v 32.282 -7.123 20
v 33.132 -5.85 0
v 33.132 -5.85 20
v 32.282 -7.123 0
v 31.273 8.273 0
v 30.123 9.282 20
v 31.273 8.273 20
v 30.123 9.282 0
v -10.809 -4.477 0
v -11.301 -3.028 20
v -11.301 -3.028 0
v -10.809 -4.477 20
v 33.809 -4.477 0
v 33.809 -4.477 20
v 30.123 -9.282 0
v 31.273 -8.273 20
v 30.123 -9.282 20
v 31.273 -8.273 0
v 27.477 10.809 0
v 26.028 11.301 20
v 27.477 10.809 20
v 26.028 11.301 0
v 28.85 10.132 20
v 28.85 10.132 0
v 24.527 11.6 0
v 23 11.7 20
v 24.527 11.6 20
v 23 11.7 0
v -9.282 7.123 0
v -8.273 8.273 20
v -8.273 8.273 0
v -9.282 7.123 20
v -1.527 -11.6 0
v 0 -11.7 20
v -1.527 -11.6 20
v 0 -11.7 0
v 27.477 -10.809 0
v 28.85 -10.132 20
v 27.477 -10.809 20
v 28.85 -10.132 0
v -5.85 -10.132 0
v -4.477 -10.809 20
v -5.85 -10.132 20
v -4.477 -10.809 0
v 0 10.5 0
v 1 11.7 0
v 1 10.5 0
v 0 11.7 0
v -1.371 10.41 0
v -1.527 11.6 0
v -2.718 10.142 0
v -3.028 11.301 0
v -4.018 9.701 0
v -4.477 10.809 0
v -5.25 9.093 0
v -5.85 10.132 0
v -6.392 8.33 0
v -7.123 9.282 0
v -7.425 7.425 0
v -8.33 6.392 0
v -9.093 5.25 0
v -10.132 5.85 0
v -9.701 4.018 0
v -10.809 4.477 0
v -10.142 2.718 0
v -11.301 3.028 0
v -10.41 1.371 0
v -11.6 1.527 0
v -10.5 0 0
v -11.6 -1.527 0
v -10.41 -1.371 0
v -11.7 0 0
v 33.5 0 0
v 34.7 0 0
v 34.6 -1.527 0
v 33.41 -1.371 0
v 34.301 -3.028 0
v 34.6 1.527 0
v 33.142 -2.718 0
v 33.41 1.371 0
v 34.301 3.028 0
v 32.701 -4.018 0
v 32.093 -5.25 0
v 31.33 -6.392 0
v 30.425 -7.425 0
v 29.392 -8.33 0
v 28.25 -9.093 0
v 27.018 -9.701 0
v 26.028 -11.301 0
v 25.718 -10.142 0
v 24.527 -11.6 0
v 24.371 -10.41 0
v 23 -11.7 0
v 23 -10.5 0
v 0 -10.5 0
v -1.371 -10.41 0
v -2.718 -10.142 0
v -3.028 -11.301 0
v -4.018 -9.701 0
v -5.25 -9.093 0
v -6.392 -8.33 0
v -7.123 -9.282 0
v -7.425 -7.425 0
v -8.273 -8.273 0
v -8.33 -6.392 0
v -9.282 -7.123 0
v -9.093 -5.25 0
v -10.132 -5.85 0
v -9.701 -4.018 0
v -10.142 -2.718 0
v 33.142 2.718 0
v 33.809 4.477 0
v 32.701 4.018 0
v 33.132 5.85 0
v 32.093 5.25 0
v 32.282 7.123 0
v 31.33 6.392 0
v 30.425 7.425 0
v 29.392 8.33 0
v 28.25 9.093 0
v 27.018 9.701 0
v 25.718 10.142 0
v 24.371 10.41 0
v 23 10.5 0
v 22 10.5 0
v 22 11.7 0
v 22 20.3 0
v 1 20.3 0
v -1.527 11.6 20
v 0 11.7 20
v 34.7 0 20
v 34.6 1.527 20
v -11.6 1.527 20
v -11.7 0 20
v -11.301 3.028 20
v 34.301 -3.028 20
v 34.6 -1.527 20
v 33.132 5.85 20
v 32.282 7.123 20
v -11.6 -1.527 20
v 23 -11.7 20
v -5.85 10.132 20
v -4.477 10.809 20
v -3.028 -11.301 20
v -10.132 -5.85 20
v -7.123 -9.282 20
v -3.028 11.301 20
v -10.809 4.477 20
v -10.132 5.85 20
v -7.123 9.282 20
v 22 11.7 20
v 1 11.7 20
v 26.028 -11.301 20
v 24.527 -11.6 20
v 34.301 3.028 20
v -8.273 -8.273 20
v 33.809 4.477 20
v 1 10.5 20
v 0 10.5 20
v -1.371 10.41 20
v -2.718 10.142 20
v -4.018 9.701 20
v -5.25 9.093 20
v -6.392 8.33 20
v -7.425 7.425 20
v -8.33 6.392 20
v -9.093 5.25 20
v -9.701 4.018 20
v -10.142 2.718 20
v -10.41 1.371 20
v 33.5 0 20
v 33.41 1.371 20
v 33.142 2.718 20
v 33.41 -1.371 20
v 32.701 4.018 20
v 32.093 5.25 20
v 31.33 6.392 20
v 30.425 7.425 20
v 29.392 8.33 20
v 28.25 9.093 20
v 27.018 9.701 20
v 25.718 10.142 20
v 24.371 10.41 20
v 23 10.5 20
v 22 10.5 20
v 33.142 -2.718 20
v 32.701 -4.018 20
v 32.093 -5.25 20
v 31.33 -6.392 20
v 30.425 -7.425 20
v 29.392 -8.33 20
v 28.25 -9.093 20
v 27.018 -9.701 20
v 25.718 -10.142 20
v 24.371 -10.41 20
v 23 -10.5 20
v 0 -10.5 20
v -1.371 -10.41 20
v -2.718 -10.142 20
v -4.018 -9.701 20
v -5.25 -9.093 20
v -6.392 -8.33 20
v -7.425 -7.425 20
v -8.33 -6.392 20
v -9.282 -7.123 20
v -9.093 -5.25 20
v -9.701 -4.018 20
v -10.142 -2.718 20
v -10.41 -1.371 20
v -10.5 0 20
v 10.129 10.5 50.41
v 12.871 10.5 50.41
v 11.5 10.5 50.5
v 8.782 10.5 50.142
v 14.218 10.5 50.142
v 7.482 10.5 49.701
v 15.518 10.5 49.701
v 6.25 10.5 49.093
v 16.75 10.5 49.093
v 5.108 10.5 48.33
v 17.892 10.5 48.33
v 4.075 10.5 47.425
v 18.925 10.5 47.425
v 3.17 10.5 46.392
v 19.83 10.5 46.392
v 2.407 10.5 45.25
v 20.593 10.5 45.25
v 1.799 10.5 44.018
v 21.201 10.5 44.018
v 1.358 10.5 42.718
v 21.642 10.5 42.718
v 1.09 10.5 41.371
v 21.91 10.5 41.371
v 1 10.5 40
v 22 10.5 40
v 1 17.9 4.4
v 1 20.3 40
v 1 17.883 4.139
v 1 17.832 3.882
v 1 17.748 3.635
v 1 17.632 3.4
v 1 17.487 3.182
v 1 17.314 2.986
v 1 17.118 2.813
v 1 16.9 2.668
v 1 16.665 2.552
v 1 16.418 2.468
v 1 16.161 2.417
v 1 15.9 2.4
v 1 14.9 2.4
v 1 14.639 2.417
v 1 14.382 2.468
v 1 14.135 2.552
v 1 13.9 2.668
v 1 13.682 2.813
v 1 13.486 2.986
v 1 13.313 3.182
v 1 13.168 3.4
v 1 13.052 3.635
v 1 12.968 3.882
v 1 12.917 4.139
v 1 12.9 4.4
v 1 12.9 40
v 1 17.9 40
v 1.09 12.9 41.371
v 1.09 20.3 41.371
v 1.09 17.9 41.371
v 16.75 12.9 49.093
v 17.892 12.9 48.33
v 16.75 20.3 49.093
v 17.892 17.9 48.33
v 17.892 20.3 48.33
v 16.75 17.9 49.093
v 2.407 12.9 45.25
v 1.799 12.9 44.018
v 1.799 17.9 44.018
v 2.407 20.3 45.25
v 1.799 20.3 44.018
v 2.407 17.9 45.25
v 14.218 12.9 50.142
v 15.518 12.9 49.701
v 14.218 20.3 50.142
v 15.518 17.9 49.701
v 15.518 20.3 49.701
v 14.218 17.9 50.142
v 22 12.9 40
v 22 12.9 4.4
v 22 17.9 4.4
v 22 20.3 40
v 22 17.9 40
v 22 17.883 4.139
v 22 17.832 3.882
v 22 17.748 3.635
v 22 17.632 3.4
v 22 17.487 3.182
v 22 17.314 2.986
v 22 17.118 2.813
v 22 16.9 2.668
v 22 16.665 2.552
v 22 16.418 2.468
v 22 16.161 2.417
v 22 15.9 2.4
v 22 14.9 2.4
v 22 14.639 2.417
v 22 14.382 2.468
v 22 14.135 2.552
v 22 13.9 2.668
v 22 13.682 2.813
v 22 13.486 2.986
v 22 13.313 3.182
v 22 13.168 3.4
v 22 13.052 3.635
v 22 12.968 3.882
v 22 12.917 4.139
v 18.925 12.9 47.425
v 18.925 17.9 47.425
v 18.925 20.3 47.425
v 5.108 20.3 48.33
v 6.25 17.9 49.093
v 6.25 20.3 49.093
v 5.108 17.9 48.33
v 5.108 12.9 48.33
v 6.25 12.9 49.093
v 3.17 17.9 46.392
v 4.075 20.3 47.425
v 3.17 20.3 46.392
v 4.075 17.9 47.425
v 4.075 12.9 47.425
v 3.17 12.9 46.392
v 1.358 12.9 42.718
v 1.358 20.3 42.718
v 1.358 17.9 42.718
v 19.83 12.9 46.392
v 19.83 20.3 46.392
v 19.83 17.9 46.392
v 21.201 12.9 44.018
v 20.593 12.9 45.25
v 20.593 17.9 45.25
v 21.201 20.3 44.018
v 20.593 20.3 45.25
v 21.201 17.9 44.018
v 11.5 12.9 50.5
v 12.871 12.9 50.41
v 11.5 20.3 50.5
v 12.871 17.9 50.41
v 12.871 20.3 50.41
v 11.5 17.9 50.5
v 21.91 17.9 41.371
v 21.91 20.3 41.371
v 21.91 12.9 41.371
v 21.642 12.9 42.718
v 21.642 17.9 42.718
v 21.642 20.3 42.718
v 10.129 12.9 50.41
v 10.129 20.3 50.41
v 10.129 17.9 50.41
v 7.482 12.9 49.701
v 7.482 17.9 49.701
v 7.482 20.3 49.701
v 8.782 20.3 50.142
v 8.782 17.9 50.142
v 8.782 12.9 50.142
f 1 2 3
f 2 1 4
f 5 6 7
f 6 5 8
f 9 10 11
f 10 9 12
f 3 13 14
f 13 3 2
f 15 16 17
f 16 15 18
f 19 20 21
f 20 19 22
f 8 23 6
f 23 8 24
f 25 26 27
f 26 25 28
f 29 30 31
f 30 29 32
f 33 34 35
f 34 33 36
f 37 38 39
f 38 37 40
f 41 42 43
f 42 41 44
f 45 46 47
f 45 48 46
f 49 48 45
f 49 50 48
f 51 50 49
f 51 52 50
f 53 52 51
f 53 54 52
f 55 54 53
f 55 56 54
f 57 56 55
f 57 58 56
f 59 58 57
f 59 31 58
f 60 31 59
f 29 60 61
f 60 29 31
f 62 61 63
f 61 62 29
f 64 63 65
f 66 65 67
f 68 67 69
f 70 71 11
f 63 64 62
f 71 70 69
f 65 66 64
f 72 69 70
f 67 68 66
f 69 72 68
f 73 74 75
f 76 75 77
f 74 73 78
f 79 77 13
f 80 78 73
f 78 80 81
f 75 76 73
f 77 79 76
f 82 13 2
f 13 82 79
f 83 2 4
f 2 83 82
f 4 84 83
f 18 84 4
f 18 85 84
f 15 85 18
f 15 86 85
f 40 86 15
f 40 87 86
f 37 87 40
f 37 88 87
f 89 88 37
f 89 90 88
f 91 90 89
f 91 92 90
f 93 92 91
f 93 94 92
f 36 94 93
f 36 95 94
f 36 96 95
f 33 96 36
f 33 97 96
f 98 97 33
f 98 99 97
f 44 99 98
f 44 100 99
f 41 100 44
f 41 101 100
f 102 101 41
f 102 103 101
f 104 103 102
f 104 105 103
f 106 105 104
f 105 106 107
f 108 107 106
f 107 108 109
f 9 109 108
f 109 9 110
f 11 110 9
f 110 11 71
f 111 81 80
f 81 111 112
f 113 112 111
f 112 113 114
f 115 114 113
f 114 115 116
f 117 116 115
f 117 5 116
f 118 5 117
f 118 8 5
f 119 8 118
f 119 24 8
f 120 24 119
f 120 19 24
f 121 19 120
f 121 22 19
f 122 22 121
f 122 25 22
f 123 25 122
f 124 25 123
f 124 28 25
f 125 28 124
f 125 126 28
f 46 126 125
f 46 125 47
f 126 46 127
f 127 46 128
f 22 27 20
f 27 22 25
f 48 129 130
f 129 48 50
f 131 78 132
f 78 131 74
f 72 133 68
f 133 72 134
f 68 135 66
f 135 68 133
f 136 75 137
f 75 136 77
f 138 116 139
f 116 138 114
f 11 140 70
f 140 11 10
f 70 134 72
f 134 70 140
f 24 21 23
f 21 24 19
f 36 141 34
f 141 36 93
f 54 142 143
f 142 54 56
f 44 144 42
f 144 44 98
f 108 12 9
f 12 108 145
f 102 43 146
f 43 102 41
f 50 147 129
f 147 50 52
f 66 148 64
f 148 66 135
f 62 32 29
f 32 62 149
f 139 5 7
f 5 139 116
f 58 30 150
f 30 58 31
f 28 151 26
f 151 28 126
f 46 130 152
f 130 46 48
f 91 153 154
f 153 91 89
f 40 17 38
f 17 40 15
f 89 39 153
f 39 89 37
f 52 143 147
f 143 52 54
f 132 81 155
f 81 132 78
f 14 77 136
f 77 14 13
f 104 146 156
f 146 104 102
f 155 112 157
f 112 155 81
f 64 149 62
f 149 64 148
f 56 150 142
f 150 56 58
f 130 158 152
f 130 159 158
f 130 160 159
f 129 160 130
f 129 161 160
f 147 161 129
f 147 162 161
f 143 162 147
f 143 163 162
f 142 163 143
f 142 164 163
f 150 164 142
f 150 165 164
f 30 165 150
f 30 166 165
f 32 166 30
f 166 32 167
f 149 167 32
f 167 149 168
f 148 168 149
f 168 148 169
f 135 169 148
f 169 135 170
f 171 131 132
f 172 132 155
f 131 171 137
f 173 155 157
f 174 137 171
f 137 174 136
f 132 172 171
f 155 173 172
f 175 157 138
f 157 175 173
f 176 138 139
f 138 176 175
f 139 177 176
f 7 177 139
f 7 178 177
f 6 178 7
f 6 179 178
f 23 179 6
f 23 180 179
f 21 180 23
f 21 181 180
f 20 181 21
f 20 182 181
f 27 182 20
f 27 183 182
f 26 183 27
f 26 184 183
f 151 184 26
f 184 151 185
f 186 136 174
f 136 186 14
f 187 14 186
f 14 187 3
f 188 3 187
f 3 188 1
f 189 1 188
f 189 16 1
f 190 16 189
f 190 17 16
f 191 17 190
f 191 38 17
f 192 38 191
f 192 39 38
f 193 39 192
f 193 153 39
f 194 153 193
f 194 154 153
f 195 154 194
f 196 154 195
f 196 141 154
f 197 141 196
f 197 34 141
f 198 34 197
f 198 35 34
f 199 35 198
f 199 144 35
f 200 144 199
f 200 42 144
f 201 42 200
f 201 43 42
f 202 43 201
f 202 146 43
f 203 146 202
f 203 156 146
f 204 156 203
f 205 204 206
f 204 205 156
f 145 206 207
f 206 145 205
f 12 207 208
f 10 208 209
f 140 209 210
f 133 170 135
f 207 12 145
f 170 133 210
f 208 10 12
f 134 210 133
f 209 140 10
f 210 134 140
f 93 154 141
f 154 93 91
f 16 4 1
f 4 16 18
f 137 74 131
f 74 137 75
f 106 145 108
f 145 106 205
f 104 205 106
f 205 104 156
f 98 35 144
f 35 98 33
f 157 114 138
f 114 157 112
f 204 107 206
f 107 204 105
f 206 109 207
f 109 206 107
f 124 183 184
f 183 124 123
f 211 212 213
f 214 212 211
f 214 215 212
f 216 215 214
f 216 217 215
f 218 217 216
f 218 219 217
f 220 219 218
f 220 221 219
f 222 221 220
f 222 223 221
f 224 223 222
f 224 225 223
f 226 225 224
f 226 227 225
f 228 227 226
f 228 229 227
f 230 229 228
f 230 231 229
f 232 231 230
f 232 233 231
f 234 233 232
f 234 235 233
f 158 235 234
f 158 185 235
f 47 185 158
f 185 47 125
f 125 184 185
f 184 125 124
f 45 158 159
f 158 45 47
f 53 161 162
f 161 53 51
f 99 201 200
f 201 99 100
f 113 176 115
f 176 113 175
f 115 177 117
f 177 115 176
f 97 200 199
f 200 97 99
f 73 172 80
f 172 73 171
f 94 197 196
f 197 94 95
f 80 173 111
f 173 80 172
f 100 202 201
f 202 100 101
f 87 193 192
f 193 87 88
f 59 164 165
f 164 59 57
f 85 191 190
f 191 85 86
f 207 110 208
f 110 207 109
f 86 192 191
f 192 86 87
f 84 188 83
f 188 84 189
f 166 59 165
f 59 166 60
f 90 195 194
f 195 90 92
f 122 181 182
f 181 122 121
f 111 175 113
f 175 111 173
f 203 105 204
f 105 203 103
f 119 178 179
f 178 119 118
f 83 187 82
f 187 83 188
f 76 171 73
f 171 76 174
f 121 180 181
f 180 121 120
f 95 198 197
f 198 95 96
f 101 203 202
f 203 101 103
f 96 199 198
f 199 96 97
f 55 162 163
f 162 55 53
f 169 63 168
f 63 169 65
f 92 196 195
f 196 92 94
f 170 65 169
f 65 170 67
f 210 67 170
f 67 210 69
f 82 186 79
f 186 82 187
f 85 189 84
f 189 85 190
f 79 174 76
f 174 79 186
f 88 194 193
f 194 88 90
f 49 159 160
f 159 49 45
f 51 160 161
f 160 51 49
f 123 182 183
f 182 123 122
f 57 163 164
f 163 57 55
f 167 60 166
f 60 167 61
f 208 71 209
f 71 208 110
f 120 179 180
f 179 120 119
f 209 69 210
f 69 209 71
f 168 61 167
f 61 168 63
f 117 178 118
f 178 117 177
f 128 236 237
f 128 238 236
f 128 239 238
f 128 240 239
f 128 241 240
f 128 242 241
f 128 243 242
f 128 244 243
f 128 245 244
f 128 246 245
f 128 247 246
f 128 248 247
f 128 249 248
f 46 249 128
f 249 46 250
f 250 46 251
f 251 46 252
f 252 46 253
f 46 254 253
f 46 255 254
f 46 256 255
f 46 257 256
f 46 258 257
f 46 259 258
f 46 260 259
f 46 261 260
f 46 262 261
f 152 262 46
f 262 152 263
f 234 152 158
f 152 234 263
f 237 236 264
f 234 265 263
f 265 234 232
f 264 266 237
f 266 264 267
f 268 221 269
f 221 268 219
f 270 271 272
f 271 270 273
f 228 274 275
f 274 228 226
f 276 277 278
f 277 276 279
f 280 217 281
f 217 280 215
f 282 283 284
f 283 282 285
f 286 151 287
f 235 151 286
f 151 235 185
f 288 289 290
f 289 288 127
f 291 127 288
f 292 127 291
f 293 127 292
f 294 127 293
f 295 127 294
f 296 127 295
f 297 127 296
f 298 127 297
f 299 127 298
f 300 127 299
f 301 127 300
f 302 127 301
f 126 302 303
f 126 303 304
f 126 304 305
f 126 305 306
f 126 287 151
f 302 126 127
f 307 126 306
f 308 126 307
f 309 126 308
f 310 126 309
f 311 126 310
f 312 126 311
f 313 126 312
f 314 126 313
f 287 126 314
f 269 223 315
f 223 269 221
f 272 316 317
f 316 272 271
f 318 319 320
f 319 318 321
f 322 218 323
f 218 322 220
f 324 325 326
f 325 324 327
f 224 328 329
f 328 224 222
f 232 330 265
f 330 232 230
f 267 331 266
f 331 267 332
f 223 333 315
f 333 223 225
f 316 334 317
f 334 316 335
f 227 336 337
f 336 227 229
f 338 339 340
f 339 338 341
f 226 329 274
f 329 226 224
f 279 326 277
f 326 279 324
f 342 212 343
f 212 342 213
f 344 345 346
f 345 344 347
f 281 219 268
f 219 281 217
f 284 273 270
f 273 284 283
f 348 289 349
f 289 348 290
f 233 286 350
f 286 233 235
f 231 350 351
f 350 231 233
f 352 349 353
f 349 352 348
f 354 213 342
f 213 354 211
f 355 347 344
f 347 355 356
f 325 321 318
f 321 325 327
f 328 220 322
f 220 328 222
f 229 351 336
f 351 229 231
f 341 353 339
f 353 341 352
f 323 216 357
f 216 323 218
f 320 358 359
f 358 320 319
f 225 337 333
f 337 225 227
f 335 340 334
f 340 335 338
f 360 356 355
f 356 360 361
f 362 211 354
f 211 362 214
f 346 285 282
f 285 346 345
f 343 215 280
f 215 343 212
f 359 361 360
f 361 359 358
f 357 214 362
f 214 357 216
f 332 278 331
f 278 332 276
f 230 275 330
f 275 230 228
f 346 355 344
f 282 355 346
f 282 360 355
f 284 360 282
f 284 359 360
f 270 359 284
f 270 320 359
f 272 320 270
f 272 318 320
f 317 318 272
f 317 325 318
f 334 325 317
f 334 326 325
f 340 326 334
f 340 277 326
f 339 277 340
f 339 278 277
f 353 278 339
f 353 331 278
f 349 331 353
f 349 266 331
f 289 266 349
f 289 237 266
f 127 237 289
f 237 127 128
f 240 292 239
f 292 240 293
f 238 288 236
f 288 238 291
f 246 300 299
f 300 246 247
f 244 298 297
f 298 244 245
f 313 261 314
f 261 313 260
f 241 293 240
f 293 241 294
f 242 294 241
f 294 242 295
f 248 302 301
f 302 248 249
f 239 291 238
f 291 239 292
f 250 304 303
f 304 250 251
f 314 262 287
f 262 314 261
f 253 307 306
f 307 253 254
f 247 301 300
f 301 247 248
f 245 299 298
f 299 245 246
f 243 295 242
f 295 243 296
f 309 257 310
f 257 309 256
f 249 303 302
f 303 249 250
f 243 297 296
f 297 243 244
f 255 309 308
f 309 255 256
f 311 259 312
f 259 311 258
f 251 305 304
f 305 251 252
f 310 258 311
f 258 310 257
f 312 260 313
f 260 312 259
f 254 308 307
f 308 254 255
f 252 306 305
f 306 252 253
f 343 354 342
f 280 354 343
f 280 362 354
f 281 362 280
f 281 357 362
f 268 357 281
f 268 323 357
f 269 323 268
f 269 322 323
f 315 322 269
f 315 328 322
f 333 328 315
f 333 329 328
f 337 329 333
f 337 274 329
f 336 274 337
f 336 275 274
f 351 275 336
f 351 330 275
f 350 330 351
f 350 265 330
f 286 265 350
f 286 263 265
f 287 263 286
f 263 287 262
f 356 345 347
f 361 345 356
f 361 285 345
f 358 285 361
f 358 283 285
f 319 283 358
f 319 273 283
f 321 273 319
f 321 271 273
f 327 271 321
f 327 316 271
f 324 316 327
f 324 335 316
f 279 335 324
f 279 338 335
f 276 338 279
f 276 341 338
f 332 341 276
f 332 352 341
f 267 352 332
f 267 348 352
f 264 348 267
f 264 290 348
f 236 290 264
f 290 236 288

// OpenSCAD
wall_thickness = 1.2; //mm
pen_thickness = 21; // mm
pen_count = 2;
extra_width_between = 2; //mm
loop_height = 20; //mm
cut_shift = 0.1;
clip_width = pen_thickness;
clip_height = 2 * loop_height - pen_thickness / 2;
clip_gap = 5; // mm
clip_wall_thickness = 2 * wall_thickness;
clip_gap_radius = 2; //mm

$fn=48;

union() {
  ring();
  clip();
}

module ring() {
  difference() {
    hull() {
      cylinder(d=pen_thickness + 2 * wall_thickness, h=loop_height);
      translate([(pen_count - 1) * (pen_thickness + extra_width_between), 0, 0]) {
        cylinder(d=pen_thickness + 2 * wall_thickness, h=loop_height);
      }
    }
    translate([0, 0, -cut_shift]) {
      hull() {
        cylinder(d=pen_thickness, h=loop_height + 2 * cut_shift);
        translate([(pen_count - 1) * (pen_thickness + extra_width_between), 0, 0]) {
          cylinder(d=pen_thickness, h=loop_height + 2 * cut_shift);
        }
      }
    }
  }
}

module clip() {
  translate([
      (pen_count - 1) * (pen_thickness + extra_width_between) / 2,
      pen_thickness / 2,
      clip_width / 2 ]) {
    rotate([0, -90, -90]) {
      difference() {
        hull() {
          translate([0, 0, (clip_gap + 2 * clip_wall_thickness) / 2])
          cube([clip_width, clip_width, clip_gap + 2 * clip_wall_thickness], true);
          translate([clip_height, 0, 0]) {
            cylinder(d=clip_width, h=(clip_gap + 2 * clip_wall_thickness));
          }
        }

        minkowski() {
          hull() {
            translate([clip_wall_thickness, 0, (clip_gap + 2 * clip_wall_thickness) / 2])
              cube([
                  clip_width - 2 * clip_gap_radius,
                  clip_width + cut_shift,
                  clip_gap - 2 * clip_gap_radius],
                  true);
            translate([clip_height, 0, clip_wall_thickness + clip_gap_radius]) {
              cylinder(d=clip_width + cut_shift, h = clip_gap - 2 * clip_gap_radius);
            }
          }
          rotate([90,90,0]) {
            cylinder(h=0.1, r=clip_gap_radius);
          }
        }
      }
    }
  }
}
